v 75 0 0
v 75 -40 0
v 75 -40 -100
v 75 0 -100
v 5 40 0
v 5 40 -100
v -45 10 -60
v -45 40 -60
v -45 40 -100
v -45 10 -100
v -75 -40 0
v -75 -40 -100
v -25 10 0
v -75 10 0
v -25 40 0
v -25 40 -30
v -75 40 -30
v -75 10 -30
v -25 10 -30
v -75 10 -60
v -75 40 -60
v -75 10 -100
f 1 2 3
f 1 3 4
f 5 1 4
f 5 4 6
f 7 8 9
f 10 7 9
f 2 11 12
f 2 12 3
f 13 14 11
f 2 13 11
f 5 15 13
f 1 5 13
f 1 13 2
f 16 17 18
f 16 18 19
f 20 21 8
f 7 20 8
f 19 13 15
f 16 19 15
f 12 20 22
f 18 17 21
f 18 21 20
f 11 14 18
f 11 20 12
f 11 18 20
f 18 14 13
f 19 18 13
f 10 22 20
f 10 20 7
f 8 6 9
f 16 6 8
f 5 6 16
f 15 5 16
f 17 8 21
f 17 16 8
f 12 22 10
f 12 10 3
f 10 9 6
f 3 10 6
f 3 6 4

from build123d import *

# Parameters (mm, degrees)
BOSS_EXTRUDE1_DEPTH = 100
SKETCH1_3_W         = 50
SKETCH1_3_H         = 30
CUT_EXTRUDE1_DEPTH  = 30
SKETCH3_W           = 30
SKETCH3_H           = 40
CUT_EXTRUDE2_DEPTH  = 30


with BuildPart() as part:
    # Sketch1 → Boss-Extrude1 (new body)
    with BuildSketch(Plane.XY):
        Polygon((-75, 40), (-75, -40), (75, -40), (75, 0), (5, 40), align=None)
    extrude(amount=-BOSS_EXTRUDE1_DEPTH)

    # Sketch1<3> → Cut-Extrude1 (cut)
    with BuildSketch(Plane.XY):
        with Locations((-50, 25)):
            Rectangle(SKETCH1_3_W, SKETCH1_3_H)
    extrude(amount=-CUT_EXTRUDE1_DEPTH, mode=Mode.SUBTRACT)

    # Sketch3 → Cut-Extrude2 (cut)
    with BuildSketch(Plane(origin=(0, 40, 0), x_dir=(1, 0, 0), z_dir=(0, 1, 0))):
        with Locations((-60, 80)):
            Rectangle(SKETCH3_W, SKETCH3_H)
    extrude(amount=-CUT_EXTRUDE2_DEPTH, mode=Mode.SUBTRACT)


solid = part.part
